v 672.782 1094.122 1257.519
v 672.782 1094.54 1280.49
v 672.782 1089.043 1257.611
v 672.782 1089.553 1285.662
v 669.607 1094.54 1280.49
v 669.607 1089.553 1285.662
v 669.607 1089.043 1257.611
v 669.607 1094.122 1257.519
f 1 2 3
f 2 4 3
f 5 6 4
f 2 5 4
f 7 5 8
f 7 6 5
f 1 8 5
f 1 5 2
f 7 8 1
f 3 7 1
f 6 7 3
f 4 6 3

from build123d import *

# Parameters (mm, degrees)
SKETCH2_W           = 3.175
SKETCH2_H           = 28.055216984
BOSS_EXTRUDE1_DEPTH = 5.08
CHAMFER1_SIZE       = 5.08


with BuildPart() as part:
    # Sketch2 → Boss-Extrude1 (new body)
    with BuildSketch(Plane(origin=(0, 1065.810275743, -19.39007848), x_dir=(1, 0, 0), z_dir=(4.449407192603594e-15, 0.9998345519923184, -0.018189795004890538))):
        with Locations((671.194724889, -1291.239942416)):
            Rectangle(SKETCH2_W, SKETCH2_H)
    extrude(amount=BOSS_EXTRUDE1_DEPTH)

    # Chamfer1
    chamfer1_edges = [part.edges().sort_by_distance(p)[0] for p in [
        (671.194724889, 1094.631984445, 1285.569114354),
    ]]
    chamfer(chamfer1_edges, length=CHAMFER1_SIZE - 0.0001)  # a hair under: the kernel refuses the full size


solid = part.part
